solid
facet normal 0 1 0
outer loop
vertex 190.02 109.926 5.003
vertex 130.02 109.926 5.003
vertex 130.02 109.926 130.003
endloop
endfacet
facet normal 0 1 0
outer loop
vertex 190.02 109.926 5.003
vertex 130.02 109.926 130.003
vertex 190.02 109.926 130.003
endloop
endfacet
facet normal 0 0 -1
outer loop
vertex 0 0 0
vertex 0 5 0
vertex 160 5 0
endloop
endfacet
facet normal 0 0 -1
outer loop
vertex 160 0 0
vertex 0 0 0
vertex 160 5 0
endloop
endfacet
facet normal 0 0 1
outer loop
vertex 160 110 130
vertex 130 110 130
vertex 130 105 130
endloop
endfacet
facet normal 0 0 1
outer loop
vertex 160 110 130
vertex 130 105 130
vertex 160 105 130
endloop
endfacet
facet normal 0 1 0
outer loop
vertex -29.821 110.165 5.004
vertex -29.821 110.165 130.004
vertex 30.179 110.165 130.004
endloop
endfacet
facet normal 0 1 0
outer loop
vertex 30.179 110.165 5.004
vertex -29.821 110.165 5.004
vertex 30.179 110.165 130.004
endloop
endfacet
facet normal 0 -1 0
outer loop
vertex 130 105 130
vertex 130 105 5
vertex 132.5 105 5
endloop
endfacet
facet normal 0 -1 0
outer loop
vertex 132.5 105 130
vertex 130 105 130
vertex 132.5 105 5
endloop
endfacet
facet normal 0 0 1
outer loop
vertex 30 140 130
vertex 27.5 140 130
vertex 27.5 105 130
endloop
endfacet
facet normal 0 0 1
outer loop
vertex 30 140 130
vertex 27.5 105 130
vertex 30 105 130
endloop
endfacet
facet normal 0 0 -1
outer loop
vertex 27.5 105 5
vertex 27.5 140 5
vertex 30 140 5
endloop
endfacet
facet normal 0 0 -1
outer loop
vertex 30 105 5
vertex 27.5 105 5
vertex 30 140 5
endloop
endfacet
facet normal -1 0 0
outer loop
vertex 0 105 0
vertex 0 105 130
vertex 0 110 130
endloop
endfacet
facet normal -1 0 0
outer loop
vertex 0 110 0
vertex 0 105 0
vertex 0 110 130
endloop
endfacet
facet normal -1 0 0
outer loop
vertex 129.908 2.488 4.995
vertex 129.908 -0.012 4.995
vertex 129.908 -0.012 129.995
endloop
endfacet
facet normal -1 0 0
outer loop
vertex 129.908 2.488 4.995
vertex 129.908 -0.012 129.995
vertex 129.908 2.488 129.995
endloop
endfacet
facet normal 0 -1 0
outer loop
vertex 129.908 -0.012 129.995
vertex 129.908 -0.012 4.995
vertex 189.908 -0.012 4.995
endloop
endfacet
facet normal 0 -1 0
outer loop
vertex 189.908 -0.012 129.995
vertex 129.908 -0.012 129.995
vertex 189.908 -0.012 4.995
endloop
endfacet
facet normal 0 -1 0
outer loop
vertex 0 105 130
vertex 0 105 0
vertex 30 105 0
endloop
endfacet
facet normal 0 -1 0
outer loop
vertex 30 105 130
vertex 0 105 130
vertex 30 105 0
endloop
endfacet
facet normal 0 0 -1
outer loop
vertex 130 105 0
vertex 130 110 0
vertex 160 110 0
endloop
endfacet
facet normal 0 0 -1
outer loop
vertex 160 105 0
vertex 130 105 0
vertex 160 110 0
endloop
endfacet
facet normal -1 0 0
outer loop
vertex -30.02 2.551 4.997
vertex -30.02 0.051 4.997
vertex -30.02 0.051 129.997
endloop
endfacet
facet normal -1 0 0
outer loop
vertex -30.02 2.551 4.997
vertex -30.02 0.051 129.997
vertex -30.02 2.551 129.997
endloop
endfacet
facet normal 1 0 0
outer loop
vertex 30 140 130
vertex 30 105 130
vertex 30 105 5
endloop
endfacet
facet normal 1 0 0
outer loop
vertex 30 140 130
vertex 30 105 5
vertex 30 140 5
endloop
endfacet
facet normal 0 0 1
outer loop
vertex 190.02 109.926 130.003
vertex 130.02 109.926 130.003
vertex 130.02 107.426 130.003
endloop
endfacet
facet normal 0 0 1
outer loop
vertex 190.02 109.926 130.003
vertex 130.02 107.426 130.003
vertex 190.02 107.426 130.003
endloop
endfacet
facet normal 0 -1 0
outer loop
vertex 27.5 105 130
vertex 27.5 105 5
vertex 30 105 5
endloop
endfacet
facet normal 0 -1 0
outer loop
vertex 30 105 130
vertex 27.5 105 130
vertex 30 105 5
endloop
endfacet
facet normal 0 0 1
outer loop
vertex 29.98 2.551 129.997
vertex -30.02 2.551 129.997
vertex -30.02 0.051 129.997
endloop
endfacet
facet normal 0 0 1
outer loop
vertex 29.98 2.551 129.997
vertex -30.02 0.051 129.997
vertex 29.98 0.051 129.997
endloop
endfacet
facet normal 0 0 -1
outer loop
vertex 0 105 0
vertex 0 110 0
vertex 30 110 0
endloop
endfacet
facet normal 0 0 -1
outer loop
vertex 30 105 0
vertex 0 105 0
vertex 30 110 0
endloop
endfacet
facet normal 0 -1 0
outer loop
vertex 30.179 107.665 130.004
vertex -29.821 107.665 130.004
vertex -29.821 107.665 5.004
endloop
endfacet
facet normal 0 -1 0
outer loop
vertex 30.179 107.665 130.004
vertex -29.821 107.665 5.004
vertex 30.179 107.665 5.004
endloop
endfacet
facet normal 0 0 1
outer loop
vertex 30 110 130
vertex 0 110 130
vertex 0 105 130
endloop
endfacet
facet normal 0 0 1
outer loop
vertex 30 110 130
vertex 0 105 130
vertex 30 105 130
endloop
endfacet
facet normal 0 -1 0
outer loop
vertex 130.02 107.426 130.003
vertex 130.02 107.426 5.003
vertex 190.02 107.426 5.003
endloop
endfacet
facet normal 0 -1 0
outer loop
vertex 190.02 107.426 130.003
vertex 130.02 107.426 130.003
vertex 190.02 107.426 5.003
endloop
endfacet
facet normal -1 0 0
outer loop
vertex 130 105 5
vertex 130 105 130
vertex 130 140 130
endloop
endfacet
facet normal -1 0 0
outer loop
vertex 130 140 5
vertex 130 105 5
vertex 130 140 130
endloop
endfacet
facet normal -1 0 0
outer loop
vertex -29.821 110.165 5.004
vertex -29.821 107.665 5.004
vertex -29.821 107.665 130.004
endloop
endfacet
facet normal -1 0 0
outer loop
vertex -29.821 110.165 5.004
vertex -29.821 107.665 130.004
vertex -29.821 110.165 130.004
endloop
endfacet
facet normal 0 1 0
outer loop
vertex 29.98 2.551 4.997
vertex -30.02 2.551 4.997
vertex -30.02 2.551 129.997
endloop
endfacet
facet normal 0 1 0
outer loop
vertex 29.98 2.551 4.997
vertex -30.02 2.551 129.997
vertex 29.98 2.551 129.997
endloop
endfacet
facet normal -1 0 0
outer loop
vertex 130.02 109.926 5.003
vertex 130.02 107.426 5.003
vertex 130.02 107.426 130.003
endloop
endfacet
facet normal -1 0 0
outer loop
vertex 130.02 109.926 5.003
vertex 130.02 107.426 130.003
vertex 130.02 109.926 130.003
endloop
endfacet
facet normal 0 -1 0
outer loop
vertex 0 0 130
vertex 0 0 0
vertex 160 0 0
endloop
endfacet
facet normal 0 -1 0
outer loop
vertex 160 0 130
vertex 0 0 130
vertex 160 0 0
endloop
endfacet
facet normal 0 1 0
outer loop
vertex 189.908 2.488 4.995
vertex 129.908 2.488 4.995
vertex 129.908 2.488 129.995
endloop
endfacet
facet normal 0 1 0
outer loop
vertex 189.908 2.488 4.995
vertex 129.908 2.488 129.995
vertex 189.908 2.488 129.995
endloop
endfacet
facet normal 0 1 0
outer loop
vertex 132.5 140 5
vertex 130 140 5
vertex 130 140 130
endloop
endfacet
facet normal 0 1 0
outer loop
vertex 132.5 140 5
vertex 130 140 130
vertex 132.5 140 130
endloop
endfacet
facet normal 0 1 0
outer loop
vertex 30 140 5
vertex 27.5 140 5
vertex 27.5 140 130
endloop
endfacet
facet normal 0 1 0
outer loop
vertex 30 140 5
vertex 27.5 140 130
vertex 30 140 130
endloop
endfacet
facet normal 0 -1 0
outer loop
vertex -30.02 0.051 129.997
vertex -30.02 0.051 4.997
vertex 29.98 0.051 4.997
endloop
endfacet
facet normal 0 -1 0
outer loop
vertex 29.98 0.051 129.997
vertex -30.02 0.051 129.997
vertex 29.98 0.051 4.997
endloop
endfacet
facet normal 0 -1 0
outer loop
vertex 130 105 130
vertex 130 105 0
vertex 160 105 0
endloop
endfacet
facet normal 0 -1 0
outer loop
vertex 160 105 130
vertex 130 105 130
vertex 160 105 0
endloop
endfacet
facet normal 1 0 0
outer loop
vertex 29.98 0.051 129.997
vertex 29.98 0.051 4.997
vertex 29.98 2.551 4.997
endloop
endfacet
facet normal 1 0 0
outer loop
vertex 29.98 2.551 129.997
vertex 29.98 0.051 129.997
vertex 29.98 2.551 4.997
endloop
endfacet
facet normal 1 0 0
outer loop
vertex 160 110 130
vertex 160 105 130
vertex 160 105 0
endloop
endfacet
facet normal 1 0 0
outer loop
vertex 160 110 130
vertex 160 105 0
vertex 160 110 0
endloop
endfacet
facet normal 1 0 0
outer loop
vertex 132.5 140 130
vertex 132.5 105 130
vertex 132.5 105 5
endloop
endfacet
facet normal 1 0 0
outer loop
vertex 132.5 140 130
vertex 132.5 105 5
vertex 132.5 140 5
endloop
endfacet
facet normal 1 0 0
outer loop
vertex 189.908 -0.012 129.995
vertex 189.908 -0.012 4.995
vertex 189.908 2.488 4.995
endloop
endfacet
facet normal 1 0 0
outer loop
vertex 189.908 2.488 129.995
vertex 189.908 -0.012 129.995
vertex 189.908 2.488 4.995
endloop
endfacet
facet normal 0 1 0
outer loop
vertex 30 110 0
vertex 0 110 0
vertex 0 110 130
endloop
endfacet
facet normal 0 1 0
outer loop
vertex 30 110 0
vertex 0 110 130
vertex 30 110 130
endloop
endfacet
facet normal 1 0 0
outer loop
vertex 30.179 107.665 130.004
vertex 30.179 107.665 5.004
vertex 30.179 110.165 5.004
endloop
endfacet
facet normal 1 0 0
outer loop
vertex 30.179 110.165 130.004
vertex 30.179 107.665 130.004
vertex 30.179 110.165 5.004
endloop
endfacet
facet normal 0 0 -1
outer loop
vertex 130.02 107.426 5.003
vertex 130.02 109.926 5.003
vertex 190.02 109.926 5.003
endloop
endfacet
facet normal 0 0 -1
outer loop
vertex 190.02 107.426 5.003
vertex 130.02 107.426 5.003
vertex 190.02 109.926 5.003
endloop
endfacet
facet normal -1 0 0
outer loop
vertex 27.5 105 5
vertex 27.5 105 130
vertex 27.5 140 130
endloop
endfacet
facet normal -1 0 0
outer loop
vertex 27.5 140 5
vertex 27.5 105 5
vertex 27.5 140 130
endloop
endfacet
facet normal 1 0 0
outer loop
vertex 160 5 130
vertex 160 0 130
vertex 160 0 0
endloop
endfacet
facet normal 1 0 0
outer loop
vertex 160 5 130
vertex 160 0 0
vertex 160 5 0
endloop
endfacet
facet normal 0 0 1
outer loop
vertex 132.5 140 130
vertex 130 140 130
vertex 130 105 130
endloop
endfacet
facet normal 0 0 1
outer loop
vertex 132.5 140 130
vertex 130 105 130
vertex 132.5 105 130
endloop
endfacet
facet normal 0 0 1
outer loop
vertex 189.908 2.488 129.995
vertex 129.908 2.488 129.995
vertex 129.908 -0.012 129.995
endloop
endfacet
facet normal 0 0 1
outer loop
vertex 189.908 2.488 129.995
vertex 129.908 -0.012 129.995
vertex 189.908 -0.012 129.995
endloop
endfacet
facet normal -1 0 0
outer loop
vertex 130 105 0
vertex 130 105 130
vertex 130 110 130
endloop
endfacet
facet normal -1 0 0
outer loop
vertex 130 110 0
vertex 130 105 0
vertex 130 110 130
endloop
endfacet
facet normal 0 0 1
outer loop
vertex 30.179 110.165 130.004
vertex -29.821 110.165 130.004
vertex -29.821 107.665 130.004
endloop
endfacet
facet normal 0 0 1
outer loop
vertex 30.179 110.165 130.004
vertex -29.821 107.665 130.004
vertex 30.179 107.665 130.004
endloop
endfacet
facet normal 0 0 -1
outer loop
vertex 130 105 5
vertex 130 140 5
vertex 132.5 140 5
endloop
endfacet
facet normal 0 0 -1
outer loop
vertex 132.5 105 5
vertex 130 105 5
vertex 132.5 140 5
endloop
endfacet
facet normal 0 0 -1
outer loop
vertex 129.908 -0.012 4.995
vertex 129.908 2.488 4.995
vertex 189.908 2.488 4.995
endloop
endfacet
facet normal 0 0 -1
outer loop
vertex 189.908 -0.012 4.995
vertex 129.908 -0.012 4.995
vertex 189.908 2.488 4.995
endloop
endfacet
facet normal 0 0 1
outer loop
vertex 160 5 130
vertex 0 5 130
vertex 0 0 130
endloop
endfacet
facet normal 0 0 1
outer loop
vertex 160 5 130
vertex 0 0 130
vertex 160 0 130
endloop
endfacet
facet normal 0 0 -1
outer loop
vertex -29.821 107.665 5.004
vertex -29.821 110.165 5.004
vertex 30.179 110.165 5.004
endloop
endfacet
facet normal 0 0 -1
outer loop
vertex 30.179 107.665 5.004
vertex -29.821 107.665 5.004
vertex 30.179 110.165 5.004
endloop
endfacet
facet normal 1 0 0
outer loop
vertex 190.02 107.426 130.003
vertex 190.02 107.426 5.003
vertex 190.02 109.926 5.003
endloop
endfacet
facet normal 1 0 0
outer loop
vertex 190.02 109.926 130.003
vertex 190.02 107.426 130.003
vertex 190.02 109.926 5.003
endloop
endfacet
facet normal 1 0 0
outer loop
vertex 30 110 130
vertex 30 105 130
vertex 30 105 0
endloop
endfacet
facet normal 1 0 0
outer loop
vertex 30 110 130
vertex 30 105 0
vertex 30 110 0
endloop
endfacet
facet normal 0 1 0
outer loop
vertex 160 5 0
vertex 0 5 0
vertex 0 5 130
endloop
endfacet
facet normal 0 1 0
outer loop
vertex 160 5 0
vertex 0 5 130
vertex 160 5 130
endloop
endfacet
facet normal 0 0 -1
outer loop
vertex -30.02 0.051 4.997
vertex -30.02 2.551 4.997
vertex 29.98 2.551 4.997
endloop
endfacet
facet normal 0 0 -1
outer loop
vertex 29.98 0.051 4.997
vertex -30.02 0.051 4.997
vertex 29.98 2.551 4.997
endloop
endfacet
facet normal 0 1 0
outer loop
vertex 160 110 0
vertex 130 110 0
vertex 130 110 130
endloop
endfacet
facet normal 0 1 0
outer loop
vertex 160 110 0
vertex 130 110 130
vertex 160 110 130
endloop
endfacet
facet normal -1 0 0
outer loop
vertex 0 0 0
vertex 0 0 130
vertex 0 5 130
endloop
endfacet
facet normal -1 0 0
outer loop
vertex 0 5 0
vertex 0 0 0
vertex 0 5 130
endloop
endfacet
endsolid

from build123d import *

# Parameters (mm, degrees)
BOX004_W     = 160
BOX004_H     = 5
BOX004_DEPTH = 130
BOX015_W     = 30
BOX015_H     = 5
BOX015_DEPTH = 130
BOX016_W     = 30
BOX016_H     = 5
BOX016_DEPTH = 130
BOX007_W     = 60
BOX007_H     = 2.5
BOX007_DEPTH = 125
BOX006_W     = 60
BOX006_H     = 2.5
BOX006_DEPTH = 125
BOX018_W     = 60
BOX018_H     = 2.5
BOX018_DEPTH = 125
BOX019_W     = 60
BOX019_H     = 2.5
BOX019_DEPTH = 125
BOX010_W     = 2.5
BOX010_H     = 35
BOX010_DEPTH = 125
BOX020_W     = 2.5
BOX020_H     = 35
BOX020_DEPTH = 125


with BuildPart() as cube004:
    # Box004 → Box004 (new body)
    with BuildSketch(Plane.XY):
        with Locations((80, 2.5)):
            Rectangle(BOX004_W, BOX004_H)
    extrude(amount=BOX004_DEPTH)


with BuildPart() as cube015:
    # Box015 → Box015 (new body)
    with BuildSketch(Plane(origin=(0, 105, 0), x_dir=(1, 0, 0), z_dir=(0, 0, 1))):
        with Locations((15, 2.5)):
            Rectangle(BOX015_W, BOX015_H)
    extrude(amount=BOX015_DEPTH)


with BuildPart() as cube016:
    # Box016 → Box016 (new body)
    with BuildSketch(Plane(origin=(130, 105, 0), x_dir=(1, 0, 0), z_dir=(0, 0, 1))):
        with Locations((15, 2.5)):
            Rectangle(BOX016_W, BOX016_H)
    extrude(amount=BOX016_DEPTH)


with BuildPart() as cube007:
    # Box007 → Box007 (new body)
    with BuildSketch(Plane(origin=(130.02002, 107.426147, 5.003364), x_dir=(1, 0, 0), z_dir=(0, 0, 1))):
        with Locations((30, 1.25)):
            Rectangle(BOX007_W, BOX007_H)
    extrude(amount=BOX007_DEPTH)


with BuildPart() as cube006:
    # Box006 → Box006 (new body)
    with BuildSketch(Plane(origin=(129.907806, -0.011722, 4.995405), x_dir=(1, 0, 0), z_dir=(0, 0, 1))):
        with Locations((30, 1.25)):
            Rectangle(BOX006_W, BOX006_H)
    extrude(amount=BOX006_DEPTH)


with BuildPart() as cube018:
    # Box018 → Box018 (new body)
    with BuildSketch(Plane(origin=(-29.821155, 107.664871, 5.004419), x_dir=(1, 0, 0), z_dir=(0, 0, 1))):
        with Locations((30, 1.25)):
            Rectangle(BOX018_W, BOX018_H)
    extrude(amount=BOX018_DEPTH)


with BuildPart() as cube019:
    # Box019 → Box019 (new body)
    with BuildSketch(Plane(origin=(-30.020216, 0.051197, 4.996605), x_dir=(1, 0, 0), z_dir=(0, 0, 1))):
        with Locations((30, 1.25)):
            Rectangle(BOX019_W, BOX019_H)
    extrude(amount=BOX019_DEPTH)


with BuildPart() as cube010:
    # Box010 → Box010 (new body)
    with BuildSketch(Plane(origin=(27.5, 105, 5), x_dir=(1, 0, 0), z_dir=(0, 0, 1))):
        with Locations((1.25, 17.5)):
            Rectangle(BOX010_W, BOX010_H)
    extrude(amount=BOX010_DEPTH)


with BuildPart() as cube020:
    # Box020 → Box020 (new body)
    with BuildSketch(Plane(origin=(130, 105, 5), x_dir=(1, 0, 0), z_dir=(0, 0, 1))):
        with Locations((1.25, 17.5)):
            Rectangle(BOX020_W, BOX020_H)
    extrude(amount=BOX020_DEPTH)


solid = Compound([cube004.part, cube015.part, cube016.part, cube007.part, cube006.part, cube018.part, cube019.part, cube010.part, cube020.part])
